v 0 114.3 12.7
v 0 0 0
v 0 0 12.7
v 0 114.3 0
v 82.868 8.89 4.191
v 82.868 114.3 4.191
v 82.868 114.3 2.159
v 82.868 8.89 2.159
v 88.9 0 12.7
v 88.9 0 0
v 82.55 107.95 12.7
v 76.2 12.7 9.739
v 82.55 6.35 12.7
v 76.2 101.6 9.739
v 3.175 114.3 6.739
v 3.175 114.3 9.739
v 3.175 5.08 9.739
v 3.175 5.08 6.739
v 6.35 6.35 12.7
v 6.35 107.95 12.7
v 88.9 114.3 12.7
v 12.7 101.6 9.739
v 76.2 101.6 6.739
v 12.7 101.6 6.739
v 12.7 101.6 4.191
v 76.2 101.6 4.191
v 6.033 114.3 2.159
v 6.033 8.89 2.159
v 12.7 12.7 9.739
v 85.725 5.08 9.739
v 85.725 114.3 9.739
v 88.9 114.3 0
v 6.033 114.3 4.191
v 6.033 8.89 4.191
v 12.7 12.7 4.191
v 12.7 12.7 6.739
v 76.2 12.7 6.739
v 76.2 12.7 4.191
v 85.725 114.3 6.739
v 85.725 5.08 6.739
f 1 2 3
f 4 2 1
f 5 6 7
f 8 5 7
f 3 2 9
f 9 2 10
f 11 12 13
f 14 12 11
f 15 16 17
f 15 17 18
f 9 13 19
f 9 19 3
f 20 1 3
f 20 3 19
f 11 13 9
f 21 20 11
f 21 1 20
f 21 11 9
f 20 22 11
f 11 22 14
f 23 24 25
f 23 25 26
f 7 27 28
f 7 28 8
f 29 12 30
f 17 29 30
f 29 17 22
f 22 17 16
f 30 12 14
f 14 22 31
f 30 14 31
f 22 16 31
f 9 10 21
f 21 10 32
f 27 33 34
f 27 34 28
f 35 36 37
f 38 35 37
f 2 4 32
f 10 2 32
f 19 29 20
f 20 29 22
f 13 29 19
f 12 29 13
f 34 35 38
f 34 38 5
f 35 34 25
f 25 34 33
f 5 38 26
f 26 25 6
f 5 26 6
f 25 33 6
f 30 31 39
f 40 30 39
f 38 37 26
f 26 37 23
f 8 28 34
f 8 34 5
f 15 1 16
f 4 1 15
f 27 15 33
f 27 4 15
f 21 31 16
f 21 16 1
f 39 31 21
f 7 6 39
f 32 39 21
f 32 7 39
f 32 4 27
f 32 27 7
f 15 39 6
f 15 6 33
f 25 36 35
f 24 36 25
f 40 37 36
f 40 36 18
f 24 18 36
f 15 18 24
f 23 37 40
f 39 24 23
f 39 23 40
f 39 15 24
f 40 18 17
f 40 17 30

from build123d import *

# Parameters (mm, degrees)
SKETCH1_W            = 88.9
SKETCH1_H            = 114.3
BOSS_EXTRUDE1_DEPTH  = 12.7
SKETCH2_W            = 76.835
SKETCH2_H            = 2.032
TOPLOADER_CUT_DEPTH  = 105.41
SKETCH3_W            = 63.5
SKETCH3_H            = 88.9
VIEWING_WINDOW_DEPTH = 9.525
CHAMFER1_SIZE        = 6.35
CHAMFER1_SIZE2       = 2.961053629
ACRYLIC_CUT_W        = 82.55
ACRYLIC_CUT_H        = 3
CUT_EXTRUDE1_DEPTH   = 109.22


with BuildPart() as part:
    # Sketch1 → Boss-Extrude1 (new body)
    with BuildSketch(Plane.XY):
        with Locations((44.45, 57.15)):
            Rectangle(SKETCH1_W, SKETCH1_H)
    extrude(amount=BOSS_EXTRUDE1_DEPTH)

    # Sketch2 → toploader_cut (cut)
    with BuildSketch(Plane(origin=(0, 114.3, 0), x_dir=(1, 0, 0), z_dir=(0, 1, 0))):
        with Locations((44.45, -3.175)):
            Rectangle(SKETCH2_W, SKETCH2_H)
    extrude(amount=-TOPLOADER_CUT_DEPTH, mode=Mode.SUBTRACT)

    # Sketch3 → viewing_window (cut)
    with BuildSketch(Plane.XY.offset(12.7)):
        with Locations((44.45, 57.15)):
            Rectangle(SKETCH3_W, SKETCH3_H)
    extrude(amount=-VIEWING_WINDOW_DEPTH, mode=Mode.SUBTRACT)

    # Chamfer1
    chamfer1_edges = [part.edges().sort_by_distance(p)[0] for p in [
        (12.7, 57.15, 12.7),
        (44.45, 12.7, 12.7),
        (76.2, 57.15, 12.7),
        (44.45, 101.6, 12.7),
    ]]
    chamfer1_side = [part.faces().sort_by_distance(p)[0] for p in [
        (44.45, 1.44802279, 12.7),
    ]]
    chamfer(chamfer1_edges, length=CHAMFER1_SIZE, length2=CHAMFER1_SIZE2, reference=chamfer1_side[0])

    # acrylic_cut → Cut-Extrude1 (cut)
    with BuildSketch(Plane(origin=(0, 114.3, 0), x_dir=(1, 0, 0), z_dir=(0, 1, 0))):
        with Locations((44.45, -8.238946371)):
            Rectangle(ACRYLIC_CUT_W, ACRYLIC_CUT_H)
    extrude(amount=-CUT_EXTRUDE1_DEPTH, mode=Mode.SUBTRACT)


solid = part.part
